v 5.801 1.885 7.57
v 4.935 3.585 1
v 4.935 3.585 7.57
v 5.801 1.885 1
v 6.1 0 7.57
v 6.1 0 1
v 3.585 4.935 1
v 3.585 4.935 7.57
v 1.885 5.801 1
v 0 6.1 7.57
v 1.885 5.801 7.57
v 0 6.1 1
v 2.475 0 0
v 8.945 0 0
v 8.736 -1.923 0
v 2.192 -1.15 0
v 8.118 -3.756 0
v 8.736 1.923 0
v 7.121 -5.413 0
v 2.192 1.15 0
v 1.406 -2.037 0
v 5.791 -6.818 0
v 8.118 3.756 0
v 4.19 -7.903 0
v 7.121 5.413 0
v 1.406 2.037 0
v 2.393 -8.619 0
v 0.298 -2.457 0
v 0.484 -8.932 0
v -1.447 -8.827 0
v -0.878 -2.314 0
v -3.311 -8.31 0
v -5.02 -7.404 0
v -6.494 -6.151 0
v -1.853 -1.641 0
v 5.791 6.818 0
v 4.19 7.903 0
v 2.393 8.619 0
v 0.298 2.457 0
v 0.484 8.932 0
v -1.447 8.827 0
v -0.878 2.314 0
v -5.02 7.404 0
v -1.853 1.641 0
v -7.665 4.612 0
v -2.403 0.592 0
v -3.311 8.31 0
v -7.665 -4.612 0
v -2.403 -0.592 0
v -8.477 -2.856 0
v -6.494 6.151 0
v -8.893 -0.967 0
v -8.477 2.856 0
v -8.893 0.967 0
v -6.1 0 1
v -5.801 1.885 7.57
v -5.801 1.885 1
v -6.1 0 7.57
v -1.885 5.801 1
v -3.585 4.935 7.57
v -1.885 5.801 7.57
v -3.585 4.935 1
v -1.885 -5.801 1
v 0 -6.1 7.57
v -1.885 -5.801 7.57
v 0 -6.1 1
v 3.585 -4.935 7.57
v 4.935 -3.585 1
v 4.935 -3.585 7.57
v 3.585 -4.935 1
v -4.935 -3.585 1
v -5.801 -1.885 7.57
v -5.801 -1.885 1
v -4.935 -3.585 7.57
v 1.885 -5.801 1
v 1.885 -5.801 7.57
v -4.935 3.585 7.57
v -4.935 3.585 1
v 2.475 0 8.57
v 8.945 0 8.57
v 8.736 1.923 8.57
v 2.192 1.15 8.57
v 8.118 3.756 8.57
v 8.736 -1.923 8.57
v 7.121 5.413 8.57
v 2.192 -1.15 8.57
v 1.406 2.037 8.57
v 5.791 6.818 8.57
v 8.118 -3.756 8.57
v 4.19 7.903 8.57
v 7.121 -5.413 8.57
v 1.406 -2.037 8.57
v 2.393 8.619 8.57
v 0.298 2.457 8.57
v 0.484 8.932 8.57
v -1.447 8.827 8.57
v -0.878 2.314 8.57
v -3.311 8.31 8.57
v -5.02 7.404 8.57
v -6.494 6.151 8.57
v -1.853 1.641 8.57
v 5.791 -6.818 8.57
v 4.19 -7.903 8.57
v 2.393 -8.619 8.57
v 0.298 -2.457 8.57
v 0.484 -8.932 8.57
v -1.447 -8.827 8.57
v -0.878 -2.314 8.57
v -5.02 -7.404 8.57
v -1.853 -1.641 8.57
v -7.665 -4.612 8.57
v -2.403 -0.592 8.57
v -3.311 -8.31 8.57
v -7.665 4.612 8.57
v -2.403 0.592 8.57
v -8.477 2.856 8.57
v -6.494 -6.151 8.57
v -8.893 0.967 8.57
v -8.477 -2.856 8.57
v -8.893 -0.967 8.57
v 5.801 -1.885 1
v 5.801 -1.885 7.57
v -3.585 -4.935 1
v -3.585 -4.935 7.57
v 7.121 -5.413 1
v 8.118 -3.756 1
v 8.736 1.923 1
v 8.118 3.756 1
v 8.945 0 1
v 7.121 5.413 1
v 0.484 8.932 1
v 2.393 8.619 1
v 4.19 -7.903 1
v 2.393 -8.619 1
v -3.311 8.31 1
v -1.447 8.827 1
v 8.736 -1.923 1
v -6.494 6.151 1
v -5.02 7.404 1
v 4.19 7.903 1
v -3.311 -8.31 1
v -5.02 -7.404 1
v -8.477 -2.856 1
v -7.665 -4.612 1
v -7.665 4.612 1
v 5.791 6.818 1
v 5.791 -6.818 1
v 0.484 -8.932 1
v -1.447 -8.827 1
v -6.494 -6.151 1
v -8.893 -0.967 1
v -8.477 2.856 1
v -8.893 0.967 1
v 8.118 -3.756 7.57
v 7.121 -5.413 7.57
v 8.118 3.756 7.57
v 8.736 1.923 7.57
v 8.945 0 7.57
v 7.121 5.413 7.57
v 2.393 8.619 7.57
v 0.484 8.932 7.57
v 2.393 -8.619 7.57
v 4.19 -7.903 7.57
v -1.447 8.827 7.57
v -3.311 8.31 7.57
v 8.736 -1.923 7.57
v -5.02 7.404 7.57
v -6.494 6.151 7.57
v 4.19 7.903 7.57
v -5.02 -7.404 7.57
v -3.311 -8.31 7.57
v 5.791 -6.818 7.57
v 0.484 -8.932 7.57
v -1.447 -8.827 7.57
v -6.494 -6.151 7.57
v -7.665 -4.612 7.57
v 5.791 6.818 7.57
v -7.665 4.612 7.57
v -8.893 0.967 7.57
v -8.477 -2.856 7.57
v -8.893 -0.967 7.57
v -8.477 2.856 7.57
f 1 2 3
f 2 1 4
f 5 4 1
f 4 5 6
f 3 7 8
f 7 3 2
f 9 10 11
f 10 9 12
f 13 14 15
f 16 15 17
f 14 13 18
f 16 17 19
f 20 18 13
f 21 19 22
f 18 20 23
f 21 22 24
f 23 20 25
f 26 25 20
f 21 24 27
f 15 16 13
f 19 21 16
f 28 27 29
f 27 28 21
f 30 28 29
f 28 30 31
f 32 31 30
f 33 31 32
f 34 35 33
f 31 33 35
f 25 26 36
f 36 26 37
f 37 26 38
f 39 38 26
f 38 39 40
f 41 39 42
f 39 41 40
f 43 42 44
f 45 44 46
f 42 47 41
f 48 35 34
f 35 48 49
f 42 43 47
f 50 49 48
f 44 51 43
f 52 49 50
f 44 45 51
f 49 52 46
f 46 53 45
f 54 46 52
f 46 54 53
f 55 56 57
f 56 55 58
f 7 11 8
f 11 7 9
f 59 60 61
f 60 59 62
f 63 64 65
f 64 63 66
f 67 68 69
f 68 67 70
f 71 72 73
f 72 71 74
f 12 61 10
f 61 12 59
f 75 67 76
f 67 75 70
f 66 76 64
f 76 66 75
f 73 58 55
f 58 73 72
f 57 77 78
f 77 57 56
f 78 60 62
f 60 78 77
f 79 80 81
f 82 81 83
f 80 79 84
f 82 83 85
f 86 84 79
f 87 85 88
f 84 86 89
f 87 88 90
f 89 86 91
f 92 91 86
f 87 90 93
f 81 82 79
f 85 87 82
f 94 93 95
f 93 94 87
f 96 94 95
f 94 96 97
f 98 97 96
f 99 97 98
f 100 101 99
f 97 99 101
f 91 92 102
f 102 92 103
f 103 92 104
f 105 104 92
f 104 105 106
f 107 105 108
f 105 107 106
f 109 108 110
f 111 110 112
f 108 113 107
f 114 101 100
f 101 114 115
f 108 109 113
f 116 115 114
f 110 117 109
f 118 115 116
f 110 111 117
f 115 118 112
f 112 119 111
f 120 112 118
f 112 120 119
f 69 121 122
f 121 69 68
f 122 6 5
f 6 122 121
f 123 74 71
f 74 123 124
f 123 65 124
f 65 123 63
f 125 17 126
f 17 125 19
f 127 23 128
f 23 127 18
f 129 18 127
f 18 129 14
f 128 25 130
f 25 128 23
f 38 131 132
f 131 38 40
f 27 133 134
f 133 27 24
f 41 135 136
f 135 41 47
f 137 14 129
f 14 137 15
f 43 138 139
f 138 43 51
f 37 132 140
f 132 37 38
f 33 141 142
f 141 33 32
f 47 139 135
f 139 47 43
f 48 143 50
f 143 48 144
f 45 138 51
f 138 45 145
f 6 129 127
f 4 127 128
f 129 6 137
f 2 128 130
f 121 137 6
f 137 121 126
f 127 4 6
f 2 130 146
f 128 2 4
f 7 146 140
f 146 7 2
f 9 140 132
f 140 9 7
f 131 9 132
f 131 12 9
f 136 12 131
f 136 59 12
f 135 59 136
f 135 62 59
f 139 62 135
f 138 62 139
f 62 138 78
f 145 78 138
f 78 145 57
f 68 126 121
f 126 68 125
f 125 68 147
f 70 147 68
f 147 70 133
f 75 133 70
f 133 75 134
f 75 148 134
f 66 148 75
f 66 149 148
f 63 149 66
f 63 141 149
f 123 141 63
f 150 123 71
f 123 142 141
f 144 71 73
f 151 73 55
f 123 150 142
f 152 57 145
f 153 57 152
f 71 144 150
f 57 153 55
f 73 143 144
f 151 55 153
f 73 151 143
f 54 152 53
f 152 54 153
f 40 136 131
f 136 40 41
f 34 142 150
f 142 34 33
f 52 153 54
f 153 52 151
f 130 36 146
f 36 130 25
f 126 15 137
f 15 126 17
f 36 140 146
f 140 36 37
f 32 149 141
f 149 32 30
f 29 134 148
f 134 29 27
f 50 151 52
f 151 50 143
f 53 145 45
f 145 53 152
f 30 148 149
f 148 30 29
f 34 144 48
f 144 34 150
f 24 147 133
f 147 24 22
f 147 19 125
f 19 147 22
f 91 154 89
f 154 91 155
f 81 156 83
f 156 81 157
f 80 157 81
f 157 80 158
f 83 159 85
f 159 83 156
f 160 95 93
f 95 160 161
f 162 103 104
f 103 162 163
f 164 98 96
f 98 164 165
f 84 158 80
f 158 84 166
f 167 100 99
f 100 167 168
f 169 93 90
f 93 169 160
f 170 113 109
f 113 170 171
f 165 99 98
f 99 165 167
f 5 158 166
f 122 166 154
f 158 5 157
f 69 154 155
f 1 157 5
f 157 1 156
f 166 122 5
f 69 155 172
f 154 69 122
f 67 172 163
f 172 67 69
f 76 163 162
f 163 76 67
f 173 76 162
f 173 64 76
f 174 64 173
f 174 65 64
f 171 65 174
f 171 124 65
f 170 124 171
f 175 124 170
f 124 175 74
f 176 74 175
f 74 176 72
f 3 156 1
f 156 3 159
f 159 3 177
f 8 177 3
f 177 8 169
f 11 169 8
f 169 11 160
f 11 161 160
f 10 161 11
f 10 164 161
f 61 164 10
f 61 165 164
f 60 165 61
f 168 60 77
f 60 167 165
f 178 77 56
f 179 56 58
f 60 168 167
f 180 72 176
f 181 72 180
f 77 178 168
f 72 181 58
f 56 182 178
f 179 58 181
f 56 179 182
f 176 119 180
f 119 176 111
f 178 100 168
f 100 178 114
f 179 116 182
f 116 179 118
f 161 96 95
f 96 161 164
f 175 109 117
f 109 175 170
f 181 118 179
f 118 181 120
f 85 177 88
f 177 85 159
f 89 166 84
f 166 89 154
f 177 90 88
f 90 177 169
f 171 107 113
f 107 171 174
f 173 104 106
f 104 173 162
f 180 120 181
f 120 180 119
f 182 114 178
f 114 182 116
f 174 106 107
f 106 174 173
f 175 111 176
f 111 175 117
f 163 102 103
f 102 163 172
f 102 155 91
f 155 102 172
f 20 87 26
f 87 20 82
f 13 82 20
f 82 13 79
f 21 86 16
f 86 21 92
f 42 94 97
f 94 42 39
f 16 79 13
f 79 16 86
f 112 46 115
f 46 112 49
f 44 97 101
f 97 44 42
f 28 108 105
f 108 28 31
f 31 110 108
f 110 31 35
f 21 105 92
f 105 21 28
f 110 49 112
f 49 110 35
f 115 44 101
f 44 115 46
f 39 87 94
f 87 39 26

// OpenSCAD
//Size based on the anycubic GT2 idler

function idler_outer_diameter() = 17.89;
function idler_inner_diameter() = 12.20;
function idler_hole_diameter() = 4.95;
function idler_height() = 8.57;

module idler() {
    difference() {
        union() {
            cylinder(d = idler_inner_diameter(), h = idler_height());
            cylinder(d = idler_outer_diameter(), h = 1);

            translate([0, 0, idler_height() - 1])
                cylinder(d = idler_outer_diameter(), h = 1);
        }

        translate([0, 0, -idler_height()])
            cylinder(d = idler_hole_diameter(), h = idler_height() * 3, $fn = 13);
    }
}

idler();
